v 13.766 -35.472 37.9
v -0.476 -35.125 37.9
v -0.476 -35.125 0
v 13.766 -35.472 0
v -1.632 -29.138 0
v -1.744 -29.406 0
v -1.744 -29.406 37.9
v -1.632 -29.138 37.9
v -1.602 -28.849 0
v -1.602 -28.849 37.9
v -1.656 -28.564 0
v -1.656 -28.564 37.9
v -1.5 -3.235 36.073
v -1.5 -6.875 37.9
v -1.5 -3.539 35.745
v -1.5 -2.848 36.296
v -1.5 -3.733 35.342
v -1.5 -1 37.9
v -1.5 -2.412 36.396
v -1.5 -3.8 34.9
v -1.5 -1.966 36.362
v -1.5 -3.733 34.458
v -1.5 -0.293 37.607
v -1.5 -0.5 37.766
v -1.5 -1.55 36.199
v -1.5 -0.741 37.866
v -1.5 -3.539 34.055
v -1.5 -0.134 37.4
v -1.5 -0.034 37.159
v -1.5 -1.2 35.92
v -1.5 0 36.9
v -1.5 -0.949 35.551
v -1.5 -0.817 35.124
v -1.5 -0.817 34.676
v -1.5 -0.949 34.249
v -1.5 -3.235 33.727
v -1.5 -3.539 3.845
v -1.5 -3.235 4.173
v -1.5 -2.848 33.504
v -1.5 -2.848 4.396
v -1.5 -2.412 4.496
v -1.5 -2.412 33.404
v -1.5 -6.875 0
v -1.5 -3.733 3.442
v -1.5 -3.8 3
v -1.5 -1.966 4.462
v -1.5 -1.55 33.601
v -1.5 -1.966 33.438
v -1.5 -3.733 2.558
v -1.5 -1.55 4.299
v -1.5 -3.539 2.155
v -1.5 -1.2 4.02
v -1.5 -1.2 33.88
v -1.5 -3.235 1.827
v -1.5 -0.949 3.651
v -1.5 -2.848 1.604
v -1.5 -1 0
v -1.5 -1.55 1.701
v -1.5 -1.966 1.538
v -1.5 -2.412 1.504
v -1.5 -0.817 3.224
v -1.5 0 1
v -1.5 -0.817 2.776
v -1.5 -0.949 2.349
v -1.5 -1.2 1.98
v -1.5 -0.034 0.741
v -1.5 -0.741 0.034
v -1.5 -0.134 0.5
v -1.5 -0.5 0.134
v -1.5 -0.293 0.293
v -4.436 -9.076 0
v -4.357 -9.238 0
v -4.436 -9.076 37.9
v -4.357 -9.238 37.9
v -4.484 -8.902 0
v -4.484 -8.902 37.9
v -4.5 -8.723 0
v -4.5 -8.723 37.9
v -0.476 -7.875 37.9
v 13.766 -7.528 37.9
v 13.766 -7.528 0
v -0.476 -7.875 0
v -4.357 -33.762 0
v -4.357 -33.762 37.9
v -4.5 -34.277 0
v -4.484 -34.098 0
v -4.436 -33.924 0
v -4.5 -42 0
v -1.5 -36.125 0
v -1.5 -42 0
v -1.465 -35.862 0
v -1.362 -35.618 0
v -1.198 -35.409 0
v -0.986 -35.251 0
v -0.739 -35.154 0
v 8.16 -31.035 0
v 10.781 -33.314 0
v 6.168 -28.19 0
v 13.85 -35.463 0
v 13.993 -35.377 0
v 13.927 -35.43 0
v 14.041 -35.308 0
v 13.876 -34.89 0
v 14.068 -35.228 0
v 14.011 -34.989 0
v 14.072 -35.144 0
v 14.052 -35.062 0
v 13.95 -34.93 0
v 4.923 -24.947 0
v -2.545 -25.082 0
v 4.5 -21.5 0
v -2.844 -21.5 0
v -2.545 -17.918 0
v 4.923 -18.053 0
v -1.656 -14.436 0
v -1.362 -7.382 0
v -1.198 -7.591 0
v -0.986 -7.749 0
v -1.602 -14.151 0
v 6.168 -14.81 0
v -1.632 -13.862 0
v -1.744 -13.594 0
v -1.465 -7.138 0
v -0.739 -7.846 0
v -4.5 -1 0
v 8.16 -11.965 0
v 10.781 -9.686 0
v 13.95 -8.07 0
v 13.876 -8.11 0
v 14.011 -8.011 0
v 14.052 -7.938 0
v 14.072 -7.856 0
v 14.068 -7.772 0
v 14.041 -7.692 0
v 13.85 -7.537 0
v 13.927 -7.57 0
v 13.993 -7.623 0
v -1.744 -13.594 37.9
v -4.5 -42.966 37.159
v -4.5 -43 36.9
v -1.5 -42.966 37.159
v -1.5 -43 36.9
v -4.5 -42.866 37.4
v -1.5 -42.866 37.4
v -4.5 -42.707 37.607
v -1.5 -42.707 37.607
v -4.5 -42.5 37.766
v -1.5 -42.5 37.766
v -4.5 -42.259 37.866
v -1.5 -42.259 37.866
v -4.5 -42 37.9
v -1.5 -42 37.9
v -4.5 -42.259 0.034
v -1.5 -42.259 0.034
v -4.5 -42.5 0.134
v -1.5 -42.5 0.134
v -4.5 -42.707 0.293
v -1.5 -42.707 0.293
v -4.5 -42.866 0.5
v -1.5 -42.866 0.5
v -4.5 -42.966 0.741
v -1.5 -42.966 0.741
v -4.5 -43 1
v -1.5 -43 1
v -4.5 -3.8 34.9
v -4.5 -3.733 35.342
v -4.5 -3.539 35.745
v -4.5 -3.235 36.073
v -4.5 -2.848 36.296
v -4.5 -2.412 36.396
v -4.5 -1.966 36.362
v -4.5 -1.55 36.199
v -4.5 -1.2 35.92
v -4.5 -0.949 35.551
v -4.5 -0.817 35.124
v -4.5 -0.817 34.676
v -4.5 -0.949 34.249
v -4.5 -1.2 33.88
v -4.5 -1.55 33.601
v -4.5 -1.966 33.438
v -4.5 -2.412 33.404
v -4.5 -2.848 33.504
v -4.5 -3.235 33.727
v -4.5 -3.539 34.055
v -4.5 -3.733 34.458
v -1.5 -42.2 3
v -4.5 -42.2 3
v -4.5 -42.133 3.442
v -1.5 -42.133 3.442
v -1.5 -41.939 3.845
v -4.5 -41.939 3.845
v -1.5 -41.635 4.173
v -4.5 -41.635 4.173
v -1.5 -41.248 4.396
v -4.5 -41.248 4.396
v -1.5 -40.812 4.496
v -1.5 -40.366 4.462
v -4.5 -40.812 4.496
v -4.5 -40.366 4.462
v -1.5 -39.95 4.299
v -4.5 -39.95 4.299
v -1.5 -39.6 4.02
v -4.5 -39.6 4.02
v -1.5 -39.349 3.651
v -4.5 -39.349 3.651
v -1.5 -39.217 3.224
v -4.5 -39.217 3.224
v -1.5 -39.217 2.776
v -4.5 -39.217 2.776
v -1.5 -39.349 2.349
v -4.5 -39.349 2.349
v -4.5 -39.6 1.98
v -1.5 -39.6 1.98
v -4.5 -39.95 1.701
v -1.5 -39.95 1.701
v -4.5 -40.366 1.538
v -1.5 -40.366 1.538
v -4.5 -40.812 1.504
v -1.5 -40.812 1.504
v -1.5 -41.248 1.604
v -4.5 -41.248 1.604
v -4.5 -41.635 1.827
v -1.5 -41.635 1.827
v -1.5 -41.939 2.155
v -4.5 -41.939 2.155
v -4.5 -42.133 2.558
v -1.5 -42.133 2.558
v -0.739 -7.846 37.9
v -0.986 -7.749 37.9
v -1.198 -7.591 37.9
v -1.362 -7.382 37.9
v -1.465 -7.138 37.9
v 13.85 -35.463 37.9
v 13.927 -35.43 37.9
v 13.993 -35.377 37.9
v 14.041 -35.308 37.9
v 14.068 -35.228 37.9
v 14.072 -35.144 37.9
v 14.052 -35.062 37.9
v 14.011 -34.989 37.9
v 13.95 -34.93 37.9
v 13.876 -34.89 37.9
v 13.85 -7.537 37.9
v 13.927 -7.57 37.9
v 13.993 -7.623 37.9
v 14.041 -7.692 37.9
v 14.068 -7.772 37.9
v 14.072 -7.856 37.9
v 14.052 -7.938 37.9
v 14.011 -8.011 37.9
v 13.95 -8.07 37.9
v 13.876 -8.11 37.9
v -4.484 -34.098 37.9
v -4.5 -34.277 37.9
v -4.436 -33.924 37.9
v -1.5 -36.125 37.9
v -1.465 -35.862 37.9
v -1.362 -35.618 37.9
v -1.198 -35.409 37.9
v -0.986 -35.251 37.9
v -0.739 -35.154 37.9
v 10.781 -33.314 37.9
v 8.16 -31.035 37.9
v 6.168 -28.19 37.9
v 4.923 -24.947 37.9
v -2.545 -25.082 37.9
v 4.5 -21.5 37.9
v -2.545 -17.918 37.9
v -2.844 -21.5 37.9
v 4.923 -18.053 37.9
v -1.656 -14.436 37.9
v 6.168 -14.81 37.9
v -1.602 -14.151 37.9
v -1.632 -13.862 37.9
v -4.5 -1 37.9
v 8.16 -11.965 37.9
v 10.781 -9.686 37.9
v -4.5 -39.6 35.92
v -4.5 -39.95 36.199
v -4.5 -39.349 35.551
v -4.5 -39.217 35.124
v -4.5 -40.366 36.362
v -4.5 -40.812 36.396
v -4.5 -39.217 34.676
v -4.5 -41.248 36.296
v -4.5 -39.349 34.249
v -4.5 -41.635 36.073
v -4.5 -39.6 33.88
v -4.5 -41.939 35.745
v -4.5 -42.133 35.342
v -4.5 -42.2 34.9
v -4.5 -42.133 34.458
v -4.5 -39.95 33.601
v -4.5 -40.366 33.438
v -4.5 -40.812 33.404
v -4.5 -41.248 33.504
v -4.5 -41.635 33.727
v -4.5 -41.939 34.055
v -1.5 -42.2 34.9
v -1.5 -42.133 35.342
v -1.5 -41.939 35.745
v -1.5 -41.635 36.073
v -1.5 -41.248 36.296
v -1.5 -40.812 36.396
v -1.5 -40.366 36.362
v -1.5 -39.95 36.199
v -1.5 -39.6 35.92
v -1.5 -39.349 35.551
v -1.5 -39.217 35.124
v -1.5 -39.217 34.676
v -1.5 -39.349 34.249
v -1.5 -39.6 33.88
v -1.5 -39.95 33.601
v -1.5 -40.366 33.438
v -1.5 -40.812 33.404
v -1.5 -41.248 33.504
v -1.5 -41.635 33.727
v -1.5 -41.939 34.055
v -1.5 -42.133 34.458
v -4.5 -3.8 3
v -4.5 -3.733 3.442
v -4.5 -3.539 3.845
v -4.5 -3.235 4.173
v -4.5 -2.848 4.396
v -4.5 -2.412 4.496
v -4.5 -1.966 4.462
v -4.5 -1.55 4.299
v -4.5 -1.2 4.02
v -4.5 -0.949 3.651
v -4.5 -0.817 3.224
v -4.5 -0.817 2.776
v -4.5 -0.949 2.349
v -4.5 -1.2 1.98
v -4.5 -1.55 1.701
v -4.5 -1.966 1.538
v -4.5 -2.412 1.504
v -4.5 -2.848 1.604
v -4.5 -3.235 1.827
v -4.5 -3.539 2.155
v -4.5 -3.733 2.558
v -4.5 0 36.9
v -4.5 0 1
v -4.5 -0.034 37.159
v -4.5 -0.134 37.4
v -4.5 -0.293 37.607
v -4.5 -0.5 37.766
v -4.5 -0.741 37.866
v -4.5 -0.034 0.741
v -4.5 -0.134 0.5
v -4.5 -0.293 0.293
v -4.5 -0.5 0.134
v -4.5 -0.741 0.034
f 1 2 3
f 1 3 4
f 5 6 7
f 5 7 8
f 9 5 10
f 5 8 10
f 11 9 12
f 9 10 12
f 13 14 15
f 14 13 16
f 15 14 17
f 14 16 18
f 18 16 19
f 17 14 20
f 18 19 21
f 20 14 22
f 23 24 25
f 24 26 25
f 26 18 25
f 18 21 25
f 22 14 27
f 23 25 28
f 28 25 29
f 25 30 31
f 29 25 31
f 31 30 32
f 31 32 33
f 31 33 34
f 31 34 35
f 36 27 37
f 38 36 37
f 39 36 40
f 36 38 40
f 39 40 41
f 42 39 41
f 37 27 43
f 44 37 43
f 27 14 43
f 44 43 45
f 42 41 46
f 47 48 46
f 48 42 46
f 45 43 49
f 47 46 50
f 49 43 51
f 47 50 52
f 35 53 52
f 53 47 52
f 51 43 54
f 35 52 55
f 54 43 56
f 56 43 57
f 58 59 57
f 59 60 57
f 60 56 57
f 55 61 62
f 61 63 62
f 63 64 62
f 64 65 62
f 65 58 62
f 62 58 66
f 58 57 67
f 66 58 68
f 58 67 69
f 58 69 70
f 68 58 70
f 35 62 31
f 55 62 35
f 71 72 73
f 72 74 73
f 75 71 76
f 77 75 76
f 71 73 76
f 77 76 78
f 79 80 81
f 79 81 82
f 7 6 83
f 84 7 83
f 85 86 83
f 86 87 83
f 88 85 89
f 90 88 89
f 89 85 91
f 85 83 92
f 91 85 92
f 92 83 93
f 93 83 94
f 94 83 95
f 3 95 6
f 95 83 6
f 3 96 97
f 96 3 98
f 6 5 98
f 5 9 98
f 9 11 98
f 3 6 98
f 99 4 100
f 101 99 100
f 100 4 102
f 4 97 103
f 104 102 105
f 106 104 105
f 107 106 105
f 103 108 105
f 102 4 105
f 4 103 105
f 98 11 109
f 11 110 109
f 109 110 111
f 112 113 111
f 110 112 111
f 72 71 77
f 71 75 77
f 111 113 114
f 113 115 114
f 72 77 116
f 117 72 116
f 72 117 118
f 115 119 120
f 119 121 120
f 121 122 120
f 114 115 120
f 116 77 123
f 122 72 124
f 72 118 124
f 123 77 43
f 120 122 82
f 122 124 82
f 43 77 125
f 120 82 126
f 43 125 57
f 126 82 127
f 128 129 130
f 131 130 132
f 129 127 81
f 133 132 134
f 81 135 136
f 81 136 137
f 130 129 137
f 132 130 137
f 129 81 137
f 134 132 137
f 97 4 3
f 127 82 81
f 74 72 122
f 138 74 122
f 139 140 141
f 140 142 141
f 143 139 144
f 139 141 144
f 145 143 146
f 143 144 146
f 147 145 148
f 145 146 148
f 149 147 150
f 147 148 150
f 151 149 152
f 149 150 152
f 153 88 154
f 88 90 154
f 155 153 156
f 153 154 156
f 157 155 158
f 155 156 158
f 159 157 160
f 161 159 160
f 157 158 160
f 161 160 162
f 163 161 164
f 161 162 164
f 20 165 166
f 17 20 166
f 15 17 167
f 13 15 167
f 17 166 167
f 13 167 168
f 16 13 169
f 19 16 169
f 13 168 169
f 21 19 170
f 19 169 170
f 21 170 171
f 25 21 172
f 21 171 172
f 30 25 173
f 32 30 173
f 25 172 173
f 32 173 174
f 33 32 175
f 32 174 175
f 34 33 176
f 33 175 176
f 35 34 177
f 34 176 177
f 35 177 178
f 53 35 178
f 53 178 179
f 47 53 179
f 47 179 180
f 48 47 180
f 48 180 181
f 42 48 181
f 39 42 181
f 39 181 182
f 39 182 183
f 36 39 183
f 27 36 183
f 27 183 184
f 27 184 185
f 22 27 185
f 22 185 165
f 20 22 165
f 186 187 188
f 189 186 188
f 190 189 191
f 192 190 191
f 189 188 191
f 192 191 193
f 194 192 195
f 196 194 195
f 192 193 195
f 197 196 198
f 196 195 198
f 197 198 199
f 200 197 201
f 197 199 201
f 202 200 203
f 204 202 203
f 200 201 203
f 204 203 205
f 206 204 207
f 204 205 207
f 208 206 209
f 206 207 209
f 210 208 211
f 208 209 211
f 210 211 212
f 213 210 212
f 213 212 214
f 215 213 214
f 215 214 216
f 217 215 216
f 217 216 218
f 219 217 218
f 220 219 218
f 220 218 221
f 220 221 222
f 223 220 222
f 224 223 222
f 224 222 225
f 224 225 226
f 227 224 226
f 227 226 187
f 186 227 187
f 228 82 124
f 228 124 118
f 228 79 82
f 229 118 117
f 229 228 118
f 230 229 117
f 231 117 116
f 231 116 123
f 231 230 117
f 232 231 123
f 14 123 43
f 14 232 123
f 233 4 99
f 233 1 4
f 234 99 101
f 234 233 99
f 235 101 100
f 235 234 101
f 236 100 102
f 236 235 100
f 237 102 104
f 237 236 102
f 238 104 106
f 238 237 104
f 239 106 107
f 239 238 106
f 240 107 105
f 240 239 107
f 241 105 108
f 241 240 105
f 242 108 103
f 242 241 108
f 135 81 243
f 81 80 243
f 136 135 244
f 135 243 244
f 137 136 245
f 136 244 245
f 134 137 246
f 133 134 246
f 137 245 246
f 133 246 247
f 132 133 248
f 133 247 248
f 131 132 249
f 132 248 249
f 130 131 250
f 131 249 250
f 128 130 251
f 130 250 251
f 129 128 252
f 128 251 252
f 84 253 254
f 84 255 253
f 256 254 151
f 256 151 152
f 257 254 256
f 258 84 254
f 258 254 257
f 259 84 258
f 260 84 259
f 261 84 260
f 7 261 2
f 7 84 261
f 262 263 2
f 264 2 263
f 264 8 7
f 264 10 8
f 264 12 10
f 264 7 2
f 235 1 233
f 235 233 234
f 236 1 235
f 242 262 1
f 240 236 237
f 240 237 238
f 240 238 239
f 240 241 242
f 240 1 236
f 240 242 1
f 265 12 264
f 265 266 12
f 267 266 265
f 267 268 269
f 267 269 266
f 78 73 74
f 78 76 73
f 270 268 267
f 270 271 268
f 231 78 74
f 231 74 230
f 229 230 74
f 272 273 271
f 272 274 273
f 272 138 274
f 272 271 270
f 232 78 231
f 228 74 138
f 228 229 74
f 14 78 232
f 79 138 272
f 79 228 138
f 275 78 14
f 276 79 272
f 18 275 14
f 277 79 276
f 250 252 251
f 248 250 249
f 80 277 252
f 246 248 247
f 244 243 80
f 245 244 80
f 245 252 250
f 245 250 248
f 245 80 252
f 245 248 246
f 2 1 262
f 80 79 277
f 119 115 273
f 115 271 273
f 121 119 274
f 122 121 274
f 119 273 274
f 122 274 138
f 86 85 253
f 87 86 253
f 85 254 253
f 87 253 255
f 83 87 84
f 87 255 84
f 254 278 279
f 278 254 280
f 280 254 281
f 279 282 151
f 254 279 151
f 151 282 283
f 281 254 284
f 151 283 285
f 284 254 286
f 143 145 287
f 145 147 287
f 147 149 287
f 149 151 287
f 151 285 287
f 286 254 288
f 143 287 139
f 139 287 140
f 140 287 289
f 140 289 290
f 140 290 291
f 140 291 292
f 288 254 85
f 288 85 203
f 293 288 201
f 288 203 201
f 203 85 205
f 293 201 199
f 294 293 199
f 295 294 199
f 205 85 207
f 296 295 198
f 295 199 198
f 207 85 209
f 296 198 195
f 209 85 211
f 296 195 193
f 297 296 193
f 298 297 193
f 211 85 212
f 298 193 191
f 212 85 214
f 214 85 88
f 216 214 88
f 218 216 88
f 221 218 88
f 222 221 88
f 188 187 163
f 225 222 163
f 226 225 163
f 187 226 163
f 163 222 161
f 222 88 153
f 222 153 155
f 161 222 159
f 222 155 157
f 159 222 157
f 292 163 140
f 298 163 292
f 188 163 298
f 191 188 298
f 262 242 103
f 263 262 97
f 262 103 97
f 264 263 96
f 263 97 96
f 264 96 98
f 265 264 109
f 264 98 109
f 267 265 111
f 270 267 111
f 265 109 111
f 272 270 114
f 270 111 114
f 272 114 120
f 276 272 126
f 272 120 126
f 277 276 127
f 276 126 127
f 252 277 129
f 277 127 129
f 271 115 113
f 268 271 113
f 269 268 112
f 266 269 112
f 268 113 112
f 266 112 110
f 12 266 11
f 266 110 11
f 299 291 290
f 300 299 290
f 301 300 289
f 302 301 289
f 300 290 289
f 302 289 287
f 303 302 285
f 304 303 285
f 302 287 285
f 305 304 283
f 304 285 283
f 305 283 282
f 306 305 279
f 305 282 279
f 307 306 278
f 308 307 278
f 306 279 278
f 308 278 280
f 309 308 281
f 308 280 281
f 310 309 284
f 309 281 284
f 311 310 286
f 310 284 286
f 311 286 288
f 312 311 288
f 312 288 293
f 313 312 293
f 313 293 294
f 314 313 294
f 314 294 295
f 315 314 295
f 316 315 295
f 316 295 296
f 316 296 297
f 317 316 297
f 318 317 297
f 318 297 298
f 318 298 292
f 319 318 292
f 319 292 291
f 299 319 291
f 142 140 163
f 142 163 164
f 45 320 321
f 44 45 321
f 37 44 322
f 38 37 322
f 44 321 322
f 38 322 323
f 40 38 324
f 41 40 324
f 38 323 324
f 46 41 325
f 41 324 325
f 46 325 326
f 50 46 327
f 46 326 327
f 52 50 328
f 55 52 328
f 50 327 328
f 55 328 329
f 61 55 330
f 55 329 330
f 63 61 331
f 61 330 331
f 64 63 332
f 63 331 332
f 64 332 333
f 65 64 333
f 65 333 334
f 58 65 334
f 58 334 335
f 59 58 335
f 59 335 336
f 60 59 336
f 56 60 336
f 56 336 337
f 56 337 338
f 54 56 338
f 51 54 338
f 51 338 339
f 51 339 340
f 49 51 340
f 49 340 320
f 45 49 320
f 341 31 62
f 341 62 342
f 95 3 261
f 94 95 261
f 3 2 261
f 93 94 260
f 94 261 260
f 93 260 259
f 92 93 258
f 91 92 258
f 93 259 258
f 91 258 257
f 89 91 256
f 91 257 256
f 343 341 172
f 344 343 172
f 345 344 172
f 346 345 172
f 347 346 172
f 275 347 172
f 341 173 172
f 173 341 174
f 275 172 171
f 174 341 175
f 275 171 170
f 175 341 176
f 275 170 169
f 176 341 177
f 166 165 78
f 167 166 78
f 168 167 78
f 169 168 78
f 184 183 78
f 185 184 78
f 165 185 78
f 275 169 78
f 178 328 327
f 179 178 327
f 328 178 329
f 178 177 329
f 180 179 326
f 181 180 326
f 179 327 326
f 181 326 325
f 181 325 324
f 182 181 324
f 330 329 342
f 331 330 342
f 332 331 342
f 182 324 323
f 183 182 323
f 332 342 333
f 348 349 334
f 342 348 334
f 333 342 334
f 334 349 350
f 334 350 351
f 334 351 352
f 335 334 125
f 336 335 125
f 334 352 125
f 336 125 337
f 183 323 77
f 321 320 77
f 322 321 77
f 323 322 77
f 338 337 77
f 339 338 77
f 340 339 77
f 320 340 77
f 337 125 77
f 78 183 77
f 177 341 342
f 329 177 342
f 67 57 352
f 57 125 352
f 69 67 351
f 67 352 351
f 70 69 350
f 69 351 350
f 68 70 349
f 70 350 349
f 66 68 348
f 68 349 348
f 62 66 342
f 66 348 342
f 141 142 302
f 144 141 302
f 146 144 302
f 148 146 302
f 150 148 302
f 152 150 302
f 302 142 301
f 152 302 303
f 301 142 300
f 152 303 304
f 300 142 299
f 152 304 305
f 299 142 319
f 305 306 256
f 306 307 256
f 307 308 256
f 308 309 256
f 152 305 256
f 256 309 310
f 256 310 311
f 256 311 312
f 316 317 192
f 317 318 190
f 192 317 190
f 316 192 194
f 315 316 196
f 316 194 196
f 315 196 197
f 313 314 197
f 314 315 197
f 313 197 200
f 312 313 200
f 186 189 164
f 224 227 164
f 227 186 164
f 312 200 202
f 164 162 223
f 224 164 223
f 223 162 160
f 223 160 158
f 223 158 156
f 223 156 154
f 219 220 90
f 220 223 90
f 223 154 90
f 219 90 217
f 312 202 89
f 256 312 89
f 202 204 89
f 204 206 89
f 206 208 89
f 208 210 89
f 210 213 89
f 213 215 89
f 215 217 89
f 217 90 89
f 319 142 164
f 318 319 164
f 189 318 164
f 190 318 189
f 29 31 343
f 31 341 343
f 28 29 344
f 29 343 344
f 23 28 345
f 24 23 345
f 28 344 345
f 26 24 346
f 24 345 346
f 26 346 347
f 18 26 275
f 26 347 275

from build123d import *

# Parameters (mm, degrees)
EXTRUDE_1_DEPTH     = 37.9
CUT_EXTRUDE_1_REACH = 62.967
SKETCH_4_R          = 1.5
FILLET_1_R          = 0.3
FILLET_2_R          = 1


with BuildPart() as part:
    # 草图3 → 凸台-拉伸1 (new body)
    with BuildSketch(Plane.XY):
        with BuildLine():
            Line((-1.5, 0), (-4.5, 0))
            Line((-4.5, 0), (-4.5, -9))
            Line((-4.5, -9), (-1.5, -14))
            ThreePointArc((-1.5, -14), (-2.844270073, -21.5), (-1.5, -29))
            Line((-1.5, -29), (-4.5, -34))
            Line((-4.5, -34), (-4.5, -43))
            Line((-4.5, -43), (-1.5, -43))
            Line((-1.5, -43), (-1.5, -35.1))
            Line((-1.5, -35.1), (16.275513468, -35.53351048))
            ThreePointArc((16.275513468, -35.53351048), (4.5, -21.5), (16.275513468, -7.46648952))
            Line((16.275513468, -7.46648952), (-1.5, -7.9))
            Line((-1.5, -7.9), (-1.5, 0))
        make_face()
    extrude(amount=EXTRUDE_1_DEPTH)

    # 草图4 → 切除-拉伸1 (cut, up to next)
    with BuildSketch(Plane.ZY.offset(4.5), mode=Mode.PRIVATE) as cut_extrude_1_sk1:
        with Locations(Location((3, -40.7, 0), (0, 0, 270))):
            Circle(SKETCH_4_R)
    cut_extrude_1_tool1 = extrude(cut_extrude_1_sk1.sketch, amount=-CUT_EXTRUDE_1_REACH, mode=Mode.PRIVATE) & part.part
    # 草图4 → 切除-拉伸1 (cut, up to next)
    with BuildSketch(Plane.ZY.offset(4.5), mode=Mode.PRIVATE) as cut_extrude_1_sk2:
        with Locations(Location((34.9, -40.7, 0), (0, 0, 270))):
            Circle(SKETCH_4_R)
    cut_extrude_1_tool2 = extrude(cut_extrude_1_sk2.sketch, amount=-CUT_EXTRUDE_1_REACH, mode=Mode.PRIVATE) & part.part
    # 草图4 → 切除-拉伸1 (cut, up to next)
    with BuildSketch(Plane.ZY.offset(4.5), mode=Mode.PRIVATE) as cut_extrude_1_sk3:
        with Locations(Location((3, -2.3, 0), (0, 0, 270))):
            Circle(SKETCH_4_R)
    cut_extrude_1_tool3 = extrude(cut_extrude_1_sk3.sketch, amount=-CUT_EXTRUDE_1_REACH, mode=Mode.PRIVATE) & part.part
    # 草图4 → 切除-拉伸1 (cut, up to next)
    with BuildSketch(Plane.ZY.offset(4.5), mode=Mode.PRIVATE) as cut_extrude_1_sk4:
        with Locations(Location((34.9, -2.3, 0), (0, 0, 270))):
            Circle(SKETCH_4_R)
    cut_extrude_1_tool4 = extrude(cut_extrude_1_sk4.sketch, amount=-CUT_EXTRUDE_1_REACH, mode=Mode.PRIVATE) & part.part
    add(cut_extrude_1_tool1.solids().sort_by_distance((-4.5, -40.7, 3))[0], mode=Mode.SUBTRACT)
    add(cut_extrude_1_tool2.solids().sort_by_distance((-4.5, -40.7, 34.9))[0], mode=Mode.SUBTRACT)
    add(cut_extrude_1_tool3.solids().sort_by_distance((-4.5, -2.3, 3))[0], mode=Mode.SUBTRACT)
    add(cut_extrude_1_tool4.solids().sort_by_distance((-4.5, -2.3, 34.9))[0], mode=Mode.SUBTRACT)

    # 圆角1
    fillet_1_edges = [part.edges().sort_by_distance(p)[0] for p in [
        (16.275513468, -35.53351048, 18.95),
        (16.275513468, -7.46648952, 18.95),
    ]]
    fillet(fillet_1_edges, radius=FILLET_1_R)

    # 圆角2
    fillet_2_edges = [part.edges().sort_by_distance(p)[0] for p in [
        (-3, -43, 0),
        (-3, 0, 0),
        (-3, 0, 37.9),
        (-1.5, -35.1, 18.95),
        (-4.5, -34, 18.95),
        (-1.5, -29, 18.95),
        (-1.5, -14, 18.95),
        (-4.5, -9, 18.95),
        (-1.5, -7.9, 18.95),
        (-3, -43, 37.9),
    ]]
    fillet(fillet_2_edges, radius=FILLET_2_R)


solid = part.part
